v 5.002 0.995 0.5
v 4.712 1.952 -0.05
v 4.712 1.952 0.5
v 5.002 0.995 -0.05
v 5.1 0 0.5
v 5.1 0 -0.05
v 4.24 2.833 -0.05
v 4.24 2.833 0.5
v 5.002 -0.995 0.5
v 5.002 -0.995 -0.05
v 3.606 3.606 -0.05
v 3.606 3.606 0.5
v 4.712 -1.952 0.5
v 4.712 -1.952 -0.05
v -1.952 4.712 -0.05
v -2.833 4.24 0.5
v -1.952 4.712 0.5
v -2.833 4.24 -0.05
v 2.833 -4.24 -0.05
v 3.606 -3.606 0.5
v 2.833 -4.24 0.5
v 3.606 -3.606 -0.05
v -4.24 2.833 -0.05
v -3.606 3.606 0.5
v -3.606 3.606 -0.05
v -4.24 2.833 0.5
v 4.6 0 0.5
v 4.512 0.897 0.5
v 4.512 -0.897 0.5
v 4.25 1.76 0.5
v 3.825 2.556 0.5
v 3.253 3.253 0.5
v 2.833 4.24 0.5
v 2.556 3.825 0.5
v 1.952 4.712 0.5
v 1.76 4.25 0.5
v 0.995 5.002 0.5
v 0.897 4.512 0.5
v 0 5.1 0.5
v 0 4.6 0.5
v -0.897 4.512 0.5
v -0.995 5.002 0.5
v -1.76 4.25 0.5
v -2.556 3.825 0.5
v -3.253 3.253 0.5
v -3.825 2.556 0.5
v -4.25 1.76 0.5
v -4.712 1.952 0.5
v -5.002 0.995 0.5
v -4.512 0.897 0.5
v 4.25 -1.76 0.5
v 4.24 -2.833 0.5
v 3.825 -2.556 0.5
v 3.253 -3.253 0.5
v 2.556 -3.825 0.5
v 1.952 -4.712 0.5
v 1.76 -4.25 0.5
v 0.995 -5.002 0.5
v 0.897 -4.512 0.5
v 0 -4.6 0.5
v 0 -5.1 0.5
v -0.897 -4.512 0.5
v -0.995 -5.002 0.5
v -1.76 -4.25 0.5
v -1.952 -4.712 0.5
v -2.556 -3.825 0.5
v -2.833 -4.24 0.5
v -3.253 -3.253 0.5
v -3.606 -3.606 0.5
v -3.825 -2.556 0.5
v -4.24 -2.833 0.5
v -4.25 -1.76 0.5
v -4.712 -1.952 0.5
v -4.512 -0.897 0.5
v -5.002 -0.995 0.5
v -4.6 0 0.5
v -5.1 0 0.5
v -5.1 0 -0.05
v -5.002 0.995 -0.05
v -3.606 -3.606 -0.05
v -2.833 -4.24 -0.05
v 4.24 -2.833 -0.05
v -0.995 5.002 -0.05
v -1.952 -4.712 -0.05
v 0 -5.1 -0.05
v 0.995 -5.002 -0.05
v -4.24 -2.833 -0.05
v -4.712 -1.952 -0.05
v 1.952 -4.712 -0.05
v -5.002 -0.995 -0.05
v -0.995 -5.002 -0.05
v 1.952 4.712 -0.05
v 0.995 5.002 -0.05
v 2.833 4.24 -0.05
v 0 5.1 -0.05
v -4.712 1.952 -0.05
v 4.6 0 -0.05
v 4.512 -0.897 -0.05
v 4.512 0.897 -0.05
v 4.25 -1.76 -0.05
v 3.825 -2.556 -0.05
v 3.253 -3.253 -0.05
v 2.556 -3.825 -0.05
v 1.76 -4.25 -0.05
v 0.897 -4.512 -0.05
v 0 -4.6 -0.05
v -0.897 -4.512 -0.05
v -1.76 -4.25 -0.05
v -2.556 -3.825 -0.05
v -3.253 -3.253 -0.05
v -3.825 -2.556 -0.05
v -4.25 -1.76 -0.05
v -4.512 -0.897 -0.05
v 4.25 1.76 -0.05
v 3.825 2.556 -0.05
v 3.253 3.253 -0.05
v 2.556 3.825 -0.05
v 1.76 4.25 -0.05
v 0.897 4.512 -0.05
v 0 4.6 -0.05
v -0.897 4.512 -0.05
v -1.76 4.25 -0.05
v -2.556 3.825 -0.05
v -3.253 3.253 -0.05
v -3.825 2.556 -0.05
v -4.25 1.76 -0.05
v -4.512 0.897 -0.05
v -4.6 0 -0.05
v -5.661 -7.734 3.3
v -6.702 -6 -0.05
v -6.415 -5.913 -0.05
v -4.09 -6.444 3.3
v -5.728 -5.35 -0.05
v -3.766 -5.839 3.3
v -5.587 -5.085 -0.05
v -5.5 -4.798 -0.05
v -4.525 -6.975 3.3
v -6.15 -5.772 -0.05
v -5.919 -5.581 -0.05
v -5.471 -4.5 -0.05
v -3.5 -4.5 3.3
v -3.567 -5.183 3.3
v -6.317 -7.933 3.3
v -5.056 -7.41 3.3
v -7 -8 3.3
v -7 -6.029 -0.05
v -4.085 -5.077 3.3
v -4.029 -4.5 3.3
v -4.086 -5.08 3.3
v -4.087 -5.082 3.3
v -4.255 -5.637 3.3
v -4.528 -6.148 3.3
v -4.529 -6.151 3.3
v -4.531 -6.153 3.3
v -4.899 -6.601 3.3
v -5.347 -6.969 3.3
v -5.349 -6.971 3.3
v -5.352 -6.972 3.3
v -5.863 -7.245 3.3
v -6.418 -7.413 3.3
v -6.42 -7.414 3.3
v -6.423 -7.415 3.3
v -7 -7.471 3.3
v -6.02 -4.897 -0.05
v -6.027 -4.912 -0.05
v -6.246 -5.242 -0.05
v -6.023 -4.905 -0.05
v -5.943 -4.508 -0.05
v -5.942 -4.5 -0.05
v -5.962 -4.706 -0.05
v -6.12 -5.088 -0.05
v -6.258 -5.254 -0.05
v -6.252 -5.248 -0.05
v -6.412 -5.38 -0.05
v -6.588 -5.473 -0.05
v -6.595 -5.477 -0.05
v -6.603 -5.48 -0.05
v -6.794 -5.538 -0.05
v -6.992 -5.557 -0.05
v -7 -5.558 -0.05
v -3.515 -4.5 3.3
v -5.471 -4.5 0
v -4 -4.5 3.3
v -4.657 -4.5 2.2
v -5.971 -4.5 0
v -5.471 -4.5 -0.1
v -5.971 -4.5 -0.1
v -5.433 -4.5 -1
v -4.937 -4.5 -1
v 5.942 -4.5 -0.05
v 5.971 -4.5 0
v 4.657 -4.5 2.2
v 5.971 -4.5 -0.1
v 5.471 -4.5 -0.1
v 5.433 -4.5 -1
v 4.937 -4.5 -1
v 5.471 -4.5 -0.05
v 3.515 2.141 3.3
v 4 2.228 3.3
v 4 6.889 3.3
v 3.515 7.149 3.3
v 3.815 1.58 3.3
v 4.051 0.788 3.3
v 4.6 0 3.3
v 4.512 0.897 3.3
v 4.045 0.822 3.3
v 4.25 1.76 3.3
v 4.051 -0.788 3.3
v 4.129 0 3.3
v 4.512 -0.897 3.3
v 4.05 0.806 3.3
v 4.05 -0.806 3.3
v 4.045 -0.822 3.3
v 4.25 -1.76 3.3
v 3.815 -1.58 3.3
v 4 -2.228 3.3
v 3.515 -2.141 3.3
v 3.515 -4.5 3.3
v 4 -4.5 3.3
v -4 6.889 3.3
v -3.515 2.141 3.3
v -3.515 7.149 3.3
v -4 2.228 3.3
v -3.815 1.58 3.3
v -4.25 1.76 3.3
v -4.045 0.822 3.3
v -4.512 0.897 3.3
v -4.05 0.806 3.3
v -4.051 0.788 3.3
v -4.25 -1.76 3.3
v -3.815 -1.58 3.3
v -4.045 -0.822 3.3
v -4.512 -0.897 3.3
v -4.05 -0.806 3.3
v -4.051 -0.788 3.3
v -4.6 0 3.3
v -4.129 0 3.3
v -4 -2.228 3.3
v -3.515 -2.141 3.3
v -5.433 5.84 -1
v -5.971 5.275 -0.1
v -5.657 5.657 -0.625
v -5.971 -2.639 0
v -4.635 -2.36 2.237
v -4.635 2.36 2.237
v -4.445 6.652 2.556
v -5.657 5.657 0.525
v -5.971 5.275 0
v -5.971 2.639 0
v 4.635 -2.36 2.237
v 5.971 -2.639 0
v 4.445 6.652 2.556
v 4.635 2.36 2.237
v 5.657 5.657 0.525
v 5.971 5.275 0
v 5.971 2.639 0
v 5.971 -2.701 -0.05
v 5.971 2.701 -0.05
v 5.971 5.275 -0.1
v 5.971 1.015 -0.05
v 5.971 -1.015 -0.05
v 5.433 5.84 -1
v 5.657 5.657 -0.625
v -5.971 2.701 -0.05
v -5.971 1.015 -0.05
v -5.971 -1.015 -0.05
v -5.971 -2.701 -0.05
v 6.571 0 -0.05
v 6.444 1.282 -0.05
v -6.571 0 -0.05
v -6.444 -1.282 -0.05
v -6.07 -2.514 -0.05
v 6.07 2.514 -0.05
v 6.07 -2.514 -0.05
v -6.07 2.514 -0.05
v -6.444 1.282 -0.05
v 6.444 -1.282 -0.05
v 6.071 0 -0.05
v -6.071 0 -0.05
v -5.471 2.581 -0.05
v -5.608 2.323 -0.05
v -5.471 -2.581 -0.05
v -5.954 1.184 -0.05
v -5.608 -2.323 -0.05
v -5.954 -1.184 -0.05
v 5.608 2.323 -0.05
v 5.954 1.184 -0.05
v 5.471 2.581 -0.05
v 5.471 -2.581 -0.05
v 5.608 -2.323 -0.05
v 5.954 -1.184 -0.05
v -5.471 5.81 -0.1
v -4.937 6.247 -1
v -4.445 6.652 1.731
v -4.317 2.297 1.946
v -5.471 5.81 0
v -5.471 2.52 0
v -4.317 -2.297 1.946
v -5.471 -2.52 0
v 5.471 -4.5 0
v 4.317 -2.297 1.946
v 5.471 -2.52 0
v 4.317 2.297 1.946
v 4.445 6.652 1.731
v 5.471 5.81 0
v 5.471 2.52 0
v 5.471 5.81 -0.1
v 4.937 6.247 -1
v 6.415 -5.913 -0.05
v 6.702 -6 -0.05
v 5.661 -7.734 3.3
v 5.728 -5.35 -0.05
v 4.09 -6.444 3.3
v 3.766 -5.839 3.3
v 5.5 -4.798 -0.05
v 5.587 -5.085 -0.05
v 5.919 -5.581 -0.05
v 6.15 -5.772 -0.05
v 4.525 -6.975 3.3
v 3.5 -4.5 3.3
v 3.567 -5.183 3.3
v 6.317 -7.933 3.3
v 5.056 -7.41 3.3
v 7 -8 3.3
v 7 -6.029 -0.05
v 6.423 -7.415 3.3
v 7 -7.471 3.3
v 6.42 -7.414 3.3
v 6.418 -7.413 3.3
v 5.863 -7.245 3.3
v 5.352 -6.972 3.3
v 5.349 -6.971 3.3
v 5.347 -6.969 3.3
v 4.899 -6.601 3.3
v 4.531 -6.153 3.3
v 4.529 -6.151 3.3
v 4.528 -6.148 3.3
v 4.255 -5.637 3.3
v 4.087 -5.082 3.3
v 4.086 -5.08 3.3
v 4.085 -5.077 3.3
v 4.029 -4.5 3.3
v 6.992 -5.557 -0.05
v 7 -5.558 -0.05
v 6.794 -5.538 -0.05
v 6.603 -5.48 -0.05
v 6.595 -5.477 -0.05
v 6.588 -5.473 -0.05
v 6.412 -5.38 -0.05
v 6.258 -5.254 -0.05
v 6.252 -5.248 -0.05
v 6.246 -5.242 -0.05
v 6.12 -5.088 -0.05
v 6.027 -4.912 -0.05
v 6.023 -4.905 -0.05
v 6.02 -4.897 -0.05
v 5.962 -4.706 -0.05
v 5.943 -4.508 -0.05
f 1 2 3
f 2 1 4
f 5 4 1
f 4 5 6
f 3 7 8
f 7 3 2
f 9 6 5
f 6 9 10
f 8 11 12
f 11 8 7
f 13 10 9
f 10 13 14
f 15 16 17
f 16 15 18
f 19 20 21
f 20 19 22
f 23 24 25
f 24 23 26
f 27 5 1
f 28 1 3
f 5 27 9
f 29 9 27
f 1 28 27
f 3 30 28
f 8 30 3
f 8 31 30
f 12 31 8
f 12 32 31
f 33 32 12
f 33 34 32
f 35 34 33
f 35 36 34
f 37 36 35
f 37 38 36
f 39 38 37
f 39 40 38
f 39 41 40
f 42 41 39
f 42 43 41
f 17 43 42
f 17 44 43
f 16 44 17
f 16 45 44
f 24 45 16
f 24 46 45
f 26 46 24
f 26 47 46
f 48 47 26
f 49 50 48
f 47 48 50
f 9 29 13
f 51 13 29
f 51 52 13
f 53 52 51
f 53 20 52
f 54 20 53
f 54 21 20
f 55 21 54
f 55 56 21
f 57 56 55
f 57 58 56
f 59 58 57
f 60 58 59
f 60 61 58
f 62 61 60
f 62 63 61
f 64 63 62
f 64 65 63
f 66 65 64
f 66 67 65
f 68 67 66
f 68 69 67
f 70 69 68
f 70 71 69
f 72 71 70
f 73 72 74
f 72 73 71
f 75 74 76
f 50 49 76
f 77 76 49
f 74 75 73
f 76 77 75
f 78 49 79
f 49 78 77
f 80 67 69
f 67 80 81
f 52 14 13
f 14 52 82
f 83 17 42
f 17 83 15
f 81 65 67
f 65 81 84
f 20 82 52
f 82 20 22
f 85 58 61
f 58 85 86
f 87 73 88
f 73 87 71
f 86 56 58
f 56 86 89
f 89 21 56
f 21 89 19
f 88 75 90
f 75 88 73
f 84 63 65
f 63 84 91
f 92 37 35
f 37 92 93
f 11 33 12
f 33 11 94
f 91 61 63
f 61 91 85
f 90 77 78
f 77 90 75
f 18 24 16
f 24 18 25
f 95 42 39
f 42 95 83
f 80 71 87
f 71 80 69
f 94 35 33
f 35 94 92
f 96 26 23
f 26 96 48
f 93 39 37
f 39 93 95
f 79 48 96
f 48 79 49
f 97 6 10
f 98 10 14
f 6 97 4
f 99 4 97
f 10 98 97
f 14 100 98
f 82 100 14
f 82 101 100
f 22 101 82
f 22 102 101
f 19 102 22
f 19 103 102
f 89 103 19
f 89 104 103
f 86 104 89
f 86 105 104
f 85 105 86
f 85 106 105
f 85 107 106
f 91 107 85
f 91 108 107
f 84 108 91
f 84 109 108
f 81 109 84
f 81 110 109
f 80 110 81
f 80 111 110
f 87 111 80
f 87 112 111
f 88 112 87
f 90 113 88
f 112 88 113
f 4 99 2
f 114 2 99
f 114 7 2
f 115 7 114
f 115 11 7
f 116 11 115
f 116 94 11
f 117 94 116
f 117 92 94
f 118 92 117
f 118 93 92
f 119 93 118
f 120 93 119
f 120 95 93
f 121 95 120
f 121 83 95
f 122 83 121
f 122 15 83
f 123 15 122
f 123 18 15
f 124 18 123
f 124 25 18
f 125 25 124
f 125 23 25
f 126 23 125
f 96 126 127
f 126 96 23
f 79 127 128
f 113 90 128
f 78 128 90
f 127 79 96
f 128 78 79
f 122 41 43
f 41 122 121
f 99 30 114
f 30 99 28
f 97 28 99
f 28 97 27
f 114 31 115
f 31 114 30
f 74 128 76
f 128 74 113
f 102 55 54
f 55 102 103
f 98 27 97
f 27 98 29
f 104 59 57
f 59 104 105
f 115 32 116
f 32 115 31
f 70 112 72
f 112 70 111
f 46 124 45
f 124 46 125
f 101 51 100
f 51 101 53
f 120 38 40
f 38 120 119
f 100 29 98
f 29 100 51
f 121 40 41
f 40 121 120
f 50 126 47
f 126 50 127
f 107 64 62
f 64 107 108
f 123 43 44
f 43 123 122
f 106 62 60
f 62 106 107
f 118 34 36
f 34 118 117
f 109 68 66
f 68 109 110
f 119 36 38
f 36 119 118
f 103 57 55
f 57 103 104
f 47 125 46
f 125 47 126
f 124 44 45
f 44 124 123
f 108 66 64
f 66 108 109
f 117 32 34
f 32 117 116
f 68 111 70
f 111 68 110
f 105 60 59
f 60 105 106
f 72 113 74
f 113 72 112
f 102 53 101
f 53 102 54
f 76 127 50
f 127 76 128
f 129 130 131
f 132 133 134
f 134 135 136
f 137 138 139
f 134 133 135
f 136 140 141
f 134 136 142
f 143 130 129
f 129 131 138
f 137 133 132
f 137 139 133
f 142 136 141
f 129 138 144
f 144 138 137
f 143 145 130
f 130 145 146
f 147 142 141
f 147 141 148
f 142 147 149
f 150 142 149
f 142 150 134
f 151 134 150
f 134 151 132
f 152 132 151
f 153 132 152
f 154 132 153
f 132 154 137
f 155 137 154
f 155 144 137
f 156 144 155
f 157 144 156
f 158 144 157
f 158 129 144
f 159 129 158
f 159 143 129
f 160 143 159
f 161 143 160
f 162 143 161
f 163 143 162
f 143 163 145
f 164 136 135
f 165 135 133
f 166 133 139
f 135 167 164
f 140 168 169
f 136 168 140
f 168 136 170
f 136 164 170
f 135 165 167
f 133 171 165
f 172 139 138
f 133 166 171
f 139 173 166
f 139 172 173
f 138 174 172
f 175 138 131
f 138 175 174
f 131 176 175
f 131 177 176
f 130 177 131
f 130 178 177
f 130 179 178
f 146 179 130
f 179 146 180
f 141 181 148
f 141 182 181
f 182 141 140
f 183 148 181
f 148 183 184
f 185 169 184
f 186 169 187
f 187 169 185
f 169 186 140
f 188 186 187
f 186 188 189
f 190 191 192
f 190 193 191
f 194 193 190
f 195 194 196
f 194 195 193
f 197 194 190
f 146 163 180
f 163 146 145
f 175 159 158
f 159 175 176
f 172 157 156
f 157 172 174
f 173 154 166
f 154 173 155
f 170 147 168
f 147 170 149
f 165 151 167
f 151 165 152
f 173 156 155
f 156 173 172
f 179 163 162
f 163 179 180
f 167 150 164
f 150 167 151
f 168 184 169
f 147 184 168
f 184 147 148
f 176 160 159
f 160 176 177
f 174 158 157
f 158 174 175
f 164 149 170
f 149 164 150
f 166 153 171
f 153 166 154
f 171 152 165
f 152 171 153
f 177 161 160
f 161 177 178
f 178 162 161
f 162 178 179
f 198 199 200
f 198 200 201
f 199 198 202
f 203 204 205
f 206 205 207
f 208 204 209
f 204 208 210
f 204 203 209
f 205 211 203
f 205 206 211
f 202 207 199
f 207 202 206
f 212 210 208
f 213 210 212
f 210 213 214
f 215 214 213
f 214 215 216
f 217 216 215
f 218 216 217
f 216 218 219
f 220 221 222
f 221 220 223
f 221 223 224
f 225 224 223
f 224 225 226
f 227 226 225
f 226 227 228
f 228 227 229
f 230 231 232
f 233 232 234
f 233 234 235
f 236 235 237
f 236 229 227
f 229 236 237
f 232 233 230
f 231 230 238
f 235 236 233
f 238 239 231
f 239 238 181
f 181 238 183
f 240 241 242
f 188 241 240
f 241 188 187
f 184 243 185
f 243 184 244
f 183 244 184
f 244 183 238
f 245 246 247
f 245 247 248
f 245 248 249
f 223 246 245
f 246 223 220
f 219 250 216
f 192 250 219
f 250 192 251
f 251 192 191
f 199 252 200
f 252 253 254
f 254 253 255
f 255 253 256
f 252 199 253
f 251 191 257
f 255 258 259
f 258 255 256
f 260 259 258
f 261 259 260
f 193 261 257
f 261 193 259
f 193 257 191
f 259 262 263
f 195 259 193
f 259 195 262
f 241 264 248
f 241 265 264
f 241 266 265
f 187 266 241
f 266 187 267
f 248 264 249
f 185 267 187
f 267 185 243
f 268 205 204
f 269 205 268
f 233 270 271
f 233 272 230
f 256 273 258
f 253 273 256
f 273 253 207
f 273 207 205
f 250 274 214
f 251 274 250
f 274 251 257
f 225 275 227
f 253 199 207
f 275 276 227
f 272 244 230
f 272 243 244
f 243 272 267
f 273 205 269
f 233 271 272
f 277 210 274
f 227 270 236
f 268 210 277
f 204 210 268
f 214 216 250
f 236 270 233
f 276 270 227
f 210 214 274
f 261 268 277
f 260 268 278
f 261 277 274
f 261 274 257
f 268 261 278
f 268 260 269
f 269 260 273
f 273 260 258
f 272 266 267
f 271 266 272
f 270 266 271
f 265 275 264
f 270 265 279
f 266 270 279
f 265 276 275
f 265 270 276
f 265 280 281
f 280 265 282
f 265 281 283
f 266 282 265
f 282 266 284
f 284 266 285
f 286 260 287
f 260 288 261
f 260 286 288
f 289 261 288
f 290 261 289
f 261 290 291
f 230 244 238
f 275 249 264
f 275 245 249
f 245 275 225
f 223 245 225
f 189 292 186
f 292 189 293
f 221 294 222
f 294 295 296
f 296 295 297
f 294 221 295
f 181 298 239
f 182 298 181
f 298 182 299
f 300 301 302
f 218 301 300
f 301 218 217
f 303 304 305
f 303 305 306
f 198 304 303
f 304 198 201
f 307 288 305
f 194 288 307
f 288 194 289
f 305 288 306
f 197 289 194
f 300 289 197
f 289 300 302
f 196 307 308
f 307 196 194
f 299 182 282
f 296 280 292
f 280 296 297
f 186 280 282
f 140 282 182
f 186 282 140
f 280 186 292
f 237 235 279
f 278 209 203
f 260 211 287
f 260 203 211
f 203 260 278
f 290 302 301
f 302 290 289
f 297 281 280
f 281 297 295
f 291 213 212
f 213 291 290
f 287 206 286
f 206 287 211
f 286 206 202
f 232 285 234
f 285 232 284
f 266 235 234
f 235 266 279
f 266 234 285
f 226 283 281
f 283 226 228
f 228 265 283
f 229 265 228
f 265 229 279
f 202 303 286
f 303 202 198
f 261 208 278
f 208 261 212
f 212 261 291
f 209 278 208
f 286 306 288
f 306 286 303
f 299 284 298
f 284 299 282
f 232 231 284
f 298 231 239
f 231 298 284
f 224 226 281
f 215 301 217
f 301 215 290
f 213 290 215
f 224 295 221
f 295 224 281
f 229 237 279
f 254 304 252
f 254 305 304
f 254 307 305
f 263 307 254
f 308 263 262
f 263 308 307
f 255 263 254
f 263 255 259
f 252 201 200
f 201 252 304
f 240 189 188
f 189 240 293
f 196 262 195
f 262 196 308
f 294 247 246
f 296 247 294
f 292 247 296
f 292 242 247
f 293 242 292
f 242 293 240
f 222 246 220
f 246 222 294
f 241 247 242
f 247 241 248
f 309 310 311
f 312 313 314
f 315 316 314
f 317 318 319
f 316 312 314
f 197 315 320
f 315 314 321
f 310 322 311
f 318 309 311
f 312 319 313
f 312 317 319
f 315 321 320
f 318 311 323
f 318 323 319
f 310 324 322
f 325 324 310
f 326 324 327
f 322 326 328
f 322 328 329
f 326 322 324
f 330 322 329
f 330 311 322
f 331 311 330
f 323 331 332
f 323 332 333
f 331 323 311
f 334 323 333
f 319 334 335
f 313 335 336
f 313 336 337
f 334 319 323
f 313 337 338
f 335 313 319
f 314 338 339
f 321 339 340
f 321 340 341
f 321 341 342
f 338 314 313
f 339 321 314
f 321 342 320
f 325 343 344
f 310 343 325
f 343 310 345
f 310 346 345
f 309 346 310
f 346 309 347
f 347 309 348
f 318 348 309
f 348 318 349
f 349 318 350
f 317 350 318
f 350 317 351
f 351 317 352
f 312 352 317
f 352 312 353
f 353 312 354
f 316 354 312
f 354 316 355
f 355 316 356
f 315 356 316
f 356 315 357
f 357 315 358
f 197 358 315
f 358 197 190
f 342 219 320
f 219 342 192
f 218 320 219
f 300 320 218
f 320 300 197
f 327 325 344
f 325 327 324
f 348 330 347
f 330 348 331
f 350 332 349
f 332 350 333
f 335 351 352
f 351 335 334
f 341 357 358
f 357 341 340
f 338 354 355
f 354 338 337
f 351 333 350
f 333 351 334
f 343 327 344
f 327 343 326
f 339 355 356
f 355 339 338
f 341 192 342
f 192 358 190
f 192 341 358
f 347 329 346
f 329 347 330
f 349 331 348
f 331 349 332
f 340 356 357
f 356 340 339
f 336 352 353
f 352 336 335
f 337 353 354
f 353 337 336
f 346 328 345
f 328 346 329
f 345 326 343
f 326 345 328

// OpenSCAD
use <utilities.scad>;

$fn=32;
d=0.05;

tube_lens_r=5+0.1;
tube_lens_edge_h=2;
tube_lens_centre_h=4;
gripper_t=1;

body_r=8;
inner_r=body_r-1;
cutout_h=tube_lens_centre_h+1;
roof_r = inner_r-cutout_h+tube_lens_edge_h;
floor_t = 1;

pedestal_h=0.5;
        
module lens_holder(){
    union(){
        difference(){/*
            //body
            translate([0,0,-floor_t]) hull(){
                cylinder(r=body_r,h=body_r);
                translate([-body_r,-body_r,0]) cube([2*body_r,body_r,body_r]);
            }
            difference(){
                hull(){
                    translate([0,0,0]) cylinder(r=7,h=999);
                    translate([-7,-9,0]) cube([14,7,999]);
                }
                //the lens sits on a little pedestal
                translate([0,0,-d]) cylinder(r=tube_lens_r,h=d+pedestal_h);
            }*/
            translate([0,0,-d]) cylinder(r=tube_lens_r,h=d+pedestal_h);
            //beam clearance
            cylinder(r=tube_lens_r-0.5,h=999,center=true);
            
            //indent and hole for lens
            translate([0,0,0.5]) cylinder(r1=tube_lens_r,r2=tube_lens_r+0.5,h=1);
            translate([0,0,-d]) cylinder(r=tube_lens_r-0.5,h=1);
            
            //relief so it can slide in without scratches
            translate([-tube_lens_r+1,-6,1]) cube([tube_lens_r*2-2,6,0.5]); 
            
        }
        
        //gripper
//        module gripper_post(){
//            x_squash=1;
//            dy=3
//            hull(){
//                translate([0,0,-d]) cylinder(r=0.25,h=d);
//                translate([top_r-0.25,0,]) cylinder(r=0.25,h=d);
        m=1.7; //gradient of wall
        tightness=0.5; //how much the lens is squeezed in position
        transient_tightness=0.6; //how much the lens is squeezed on the way in
        bottom_r=tube_lens_r + (tube_lens_edge_h+pedestal_h)/m -tightness;
        //distance of the bottom of the wall from the edge of the cavity
        gripper_h=tube_lens_edge_h+pedestal_h+m*0.5; //height of the gripper "wall"
        dr=gripper_h/m; //distance of top of wall from cavity edge
        reflect([1,0,0]){
            f_bottom_r = inner_r - bottom_r + transient_tightness;
            translate([-inner_r,-body_r+f_bottom_r+dr,-d]) difference(){
                intersection(){
                    cylinder(r1=f_bottom_r,r2=f_bottom_r+dr, h=gripper_h);
                    rotate(-90) cube(999);
                }
                translate([0,0,-d]) cylinder(r1=f_bottom_r-0.5,
                         r2=f_bottom_r+dr-0.5, h=gripper_h+2*d);
            }
            intersection(){
                //side wall grippers, incl. rounded bit
                translate([0,0,-floor_t]) cylinder(r=body_r,h=body_r);
                difference(){
                    union(){
                        translate([0,f_bottom_r+dr,-d]) hull(){
                            cube([(bottom_r-transient_tightness)*2+1,2*body_r,2*d],center=true);
                            cube([(bottom_r-transient_tightness-dr)*2+1,2*body_r,2*gripper_h],center=true);
                        }
                        translate([0,0,-d]) cylinder(r1=bottom_r+0.5, r2=bottom_r+0.5+-dr, h=gripper_h);
                    }
                    union(){
                        translate([0,f_bottom_r+dr,-d]) hull(){
                            cube([(bottom_r-transient_tightness)*2,999,2*d],center=true);
                            cube([(bottom_r-transient_tightness-dr)*2,999,2*gripper_h+d],center=true);
                        }
                        translate([0,0,-d]) cylinder(r1=bottom_r, r2=bottom_r+-dr, h=gripper_h+d);
                    }
                }
            }
//            intersection(){
//                cylinder(r=inner_r+d,h=999);
//                hull(){
//                    translate([-7+top_r-0.5,-tube_lens_r+1-d,1.25+tube_lens_edge_h+1-d]) cube([0.5,999,d]);
//                    translate([-7+top_r-0.5-tube_lens_edge_h/2,-tube_lens_r+1-d,1.25-d]) cube([0.5,999,d]);
//                }
//            }
        }
    }
}
module lens() {
    intersection(){
        dh=tube_lens_centre_h-tube_lens_edge_h;
        rs=(pow(dh,2) + pow(tube_lens_r,2))/(2*dh);
        cylinder(r=tube_lens_r,h=999);
        translate([0,0,tube_lens_centre_h-rs]) sphere(r=rs);
    }
}

//gripper();
lens_holder();

%translate([0,0,0.5]) lens();
